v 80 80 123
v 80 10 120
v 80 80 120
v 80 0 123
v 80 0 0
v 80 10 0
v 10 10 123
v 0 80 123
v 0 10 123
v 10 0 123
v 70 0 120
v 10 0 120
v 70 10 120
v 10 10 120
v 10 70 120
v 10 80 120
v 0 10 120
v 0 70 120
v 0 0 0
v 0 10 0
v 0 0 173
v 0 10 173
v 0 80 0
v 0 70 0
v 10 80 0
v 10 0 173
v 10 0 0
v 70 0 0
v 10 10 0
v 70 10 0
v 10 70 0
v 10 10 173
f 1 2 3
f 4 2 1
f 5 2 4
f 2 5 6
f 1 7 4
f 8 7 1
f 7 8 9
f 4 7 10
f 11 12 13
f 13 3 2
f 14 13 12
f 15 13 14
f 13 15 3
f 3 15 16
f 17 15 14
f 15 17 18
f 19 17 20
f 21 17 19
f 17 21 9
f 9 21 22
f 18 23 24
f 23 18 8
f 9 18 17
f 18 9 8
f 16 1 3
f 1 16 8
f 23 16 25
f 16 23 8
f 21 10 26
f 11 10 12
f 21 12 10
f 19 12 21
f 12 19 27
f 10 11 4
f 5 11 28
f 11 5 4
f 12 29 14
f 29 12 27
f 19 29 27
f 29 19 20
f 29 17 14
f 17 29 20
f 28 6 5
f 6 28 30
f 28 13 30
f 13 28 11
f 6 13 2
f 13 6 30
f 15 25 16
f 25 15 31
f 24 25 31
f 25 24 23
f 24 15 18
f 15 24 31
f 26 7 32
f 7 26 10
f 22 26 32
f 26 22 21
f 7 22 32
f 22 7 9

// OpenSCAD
h = 120;
w = 80;
l = 80;
t = 3;
leg_b = 10;
stomp_h = 50;
stomp_b = leg_b;

// Top Base
translate([0,0,h])
cube([w,l,t]);

// Legs
cube([leg_b,leg_b,h]);
translate([w-leg_b,0,0])
cube([leg_b,leg_b,h]);
translate([0,l-leg_b,0])
cube([leg_b,leg_b,h]);

// Stomp
translate([0,0,h+t])
cube([stomp_b,stomp_b,stomp_h]);
